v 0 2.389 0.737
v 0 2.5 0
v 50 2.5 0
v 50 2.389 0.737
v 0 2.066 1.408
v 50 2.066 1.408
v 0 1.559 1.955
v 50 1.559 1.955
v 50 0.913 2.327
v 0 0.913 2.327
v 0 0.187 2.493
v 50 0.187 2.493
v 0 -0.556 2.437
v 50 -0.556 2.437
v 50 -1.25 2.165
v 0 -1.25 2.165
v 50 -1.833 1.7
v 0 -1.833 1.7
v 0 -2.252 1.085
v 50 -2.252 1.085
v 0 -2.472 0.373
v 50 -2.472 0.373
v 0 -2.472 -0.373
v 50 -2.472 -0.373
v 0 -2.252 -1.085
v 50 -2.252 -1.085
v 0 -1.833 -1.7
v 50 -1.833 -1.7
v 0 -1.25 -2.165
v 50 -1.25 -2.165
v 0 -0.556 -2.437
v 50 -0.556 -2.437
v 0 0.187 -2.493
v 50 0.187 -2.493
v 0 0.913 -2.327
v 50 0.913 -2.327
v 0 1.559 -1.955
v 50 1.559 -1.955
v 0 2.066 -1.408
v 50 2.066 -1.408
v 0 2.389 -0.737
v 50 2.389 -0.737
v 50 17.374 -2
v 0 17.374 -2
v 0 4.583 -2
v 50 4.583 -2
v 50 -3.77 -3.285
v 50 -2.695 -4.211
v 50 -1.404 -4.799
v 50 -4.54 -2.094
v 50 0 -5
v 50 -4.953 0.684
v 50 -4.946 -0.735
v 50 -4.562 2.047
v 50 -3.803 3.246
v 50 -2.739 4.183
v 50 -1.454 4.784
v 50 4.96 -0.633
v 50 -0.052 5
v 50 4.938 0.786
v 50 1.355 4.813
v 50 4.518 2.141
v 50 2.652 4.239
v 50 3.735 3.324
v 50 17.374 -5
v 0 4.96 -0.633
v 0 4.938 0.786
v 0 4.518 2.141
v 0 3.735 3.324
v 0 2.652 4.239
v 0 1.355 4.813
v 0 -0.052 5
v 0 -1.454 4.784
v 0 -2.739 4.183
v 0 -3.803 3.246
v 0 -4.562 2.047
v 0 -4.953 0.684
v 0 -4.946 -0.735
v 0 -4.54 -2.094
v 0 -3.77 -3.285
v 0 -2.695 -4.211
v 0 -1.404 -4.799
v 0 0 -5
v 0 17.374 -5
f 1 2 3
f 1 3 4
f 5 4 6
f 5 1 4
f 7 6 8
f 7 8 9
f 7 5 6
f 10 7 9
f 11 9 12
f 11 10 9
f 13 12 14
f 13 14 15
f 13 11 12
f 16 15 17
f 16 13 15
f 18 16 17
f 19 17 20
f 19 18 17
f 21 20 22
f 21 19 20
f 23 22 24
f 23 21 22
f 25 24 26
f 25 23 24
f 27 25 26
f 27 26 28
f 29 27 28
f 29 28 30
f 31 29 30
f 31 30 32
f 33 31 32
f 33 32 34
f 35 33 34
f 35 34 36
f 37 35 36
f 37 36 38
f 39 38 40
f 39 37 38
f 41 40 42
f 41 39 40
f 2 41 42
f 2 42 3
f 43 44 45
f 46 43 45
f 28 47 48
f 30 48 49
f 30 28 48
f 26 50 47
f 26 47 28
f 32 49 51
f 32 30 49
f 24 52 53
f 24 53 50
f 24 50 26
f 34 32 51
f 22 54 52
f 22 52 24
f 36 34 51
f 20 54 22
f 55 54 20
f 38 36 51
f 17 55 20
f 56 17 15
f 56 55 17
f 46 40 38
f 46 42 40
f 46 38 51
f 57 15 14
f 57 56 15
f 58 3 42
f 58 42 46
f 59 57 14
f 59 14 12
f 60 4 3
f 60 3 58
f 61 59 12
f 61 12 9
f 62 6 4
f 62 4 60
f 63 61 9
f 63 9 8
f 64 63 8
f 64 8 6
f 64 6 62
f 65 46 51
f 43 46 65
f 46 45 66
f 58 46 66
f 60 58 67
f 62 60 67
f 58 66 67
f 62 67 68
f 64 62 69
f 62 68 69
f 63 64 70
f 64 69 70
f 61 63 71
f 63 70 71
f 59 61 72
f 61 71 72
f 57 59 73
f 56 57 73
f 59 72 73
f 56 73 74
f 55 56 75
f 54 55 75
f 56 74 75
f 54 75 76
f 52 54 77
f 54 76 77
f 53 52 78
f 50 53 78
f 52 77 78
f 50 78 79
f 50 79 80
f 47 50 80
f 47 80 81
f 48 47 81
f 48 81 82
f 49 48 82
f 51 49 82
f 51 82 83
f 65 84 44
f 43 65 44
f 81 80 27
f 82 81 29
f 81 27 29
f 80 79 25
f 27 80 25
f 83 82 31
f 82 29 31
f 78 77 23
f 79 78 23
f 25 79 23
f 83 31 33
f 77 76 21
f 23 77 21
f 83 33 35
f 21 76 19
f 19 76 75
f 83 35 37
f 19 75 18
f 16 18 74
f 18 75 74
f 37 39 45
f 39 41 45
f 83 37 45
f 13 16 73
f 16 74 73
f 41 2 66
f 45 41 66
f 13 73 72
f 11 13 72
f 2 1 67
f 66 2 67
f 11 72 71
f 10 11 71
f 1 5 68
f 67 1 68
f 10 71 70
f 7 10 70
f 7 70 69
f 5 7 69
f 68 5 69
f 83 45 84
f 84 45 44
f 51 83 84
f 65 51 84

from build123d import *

# Parameters (mm, degrees)
F0_R     = 2.5
F1_DEPTH = 50


with BuildPart() as f1:
    # F0 (on Right) → F1 (new body)
    with BuildSketch(Plane.YZ):
        with BuildLine():
            Line((17.373618, -2), (4.582576, -2))
            ThreePointArc((4.582576, -2), (-2.738613, 4.1833), (0, -5))
            Line((0, -5), (17.373618, -5))
            Line((17.373618, -5), (17.373618, -2))
        make_face()
        Circle(F0_R, mode=Mode.SUBTRACT)
    extrude(amount=F1_DEPTH)


solid = f1.part
